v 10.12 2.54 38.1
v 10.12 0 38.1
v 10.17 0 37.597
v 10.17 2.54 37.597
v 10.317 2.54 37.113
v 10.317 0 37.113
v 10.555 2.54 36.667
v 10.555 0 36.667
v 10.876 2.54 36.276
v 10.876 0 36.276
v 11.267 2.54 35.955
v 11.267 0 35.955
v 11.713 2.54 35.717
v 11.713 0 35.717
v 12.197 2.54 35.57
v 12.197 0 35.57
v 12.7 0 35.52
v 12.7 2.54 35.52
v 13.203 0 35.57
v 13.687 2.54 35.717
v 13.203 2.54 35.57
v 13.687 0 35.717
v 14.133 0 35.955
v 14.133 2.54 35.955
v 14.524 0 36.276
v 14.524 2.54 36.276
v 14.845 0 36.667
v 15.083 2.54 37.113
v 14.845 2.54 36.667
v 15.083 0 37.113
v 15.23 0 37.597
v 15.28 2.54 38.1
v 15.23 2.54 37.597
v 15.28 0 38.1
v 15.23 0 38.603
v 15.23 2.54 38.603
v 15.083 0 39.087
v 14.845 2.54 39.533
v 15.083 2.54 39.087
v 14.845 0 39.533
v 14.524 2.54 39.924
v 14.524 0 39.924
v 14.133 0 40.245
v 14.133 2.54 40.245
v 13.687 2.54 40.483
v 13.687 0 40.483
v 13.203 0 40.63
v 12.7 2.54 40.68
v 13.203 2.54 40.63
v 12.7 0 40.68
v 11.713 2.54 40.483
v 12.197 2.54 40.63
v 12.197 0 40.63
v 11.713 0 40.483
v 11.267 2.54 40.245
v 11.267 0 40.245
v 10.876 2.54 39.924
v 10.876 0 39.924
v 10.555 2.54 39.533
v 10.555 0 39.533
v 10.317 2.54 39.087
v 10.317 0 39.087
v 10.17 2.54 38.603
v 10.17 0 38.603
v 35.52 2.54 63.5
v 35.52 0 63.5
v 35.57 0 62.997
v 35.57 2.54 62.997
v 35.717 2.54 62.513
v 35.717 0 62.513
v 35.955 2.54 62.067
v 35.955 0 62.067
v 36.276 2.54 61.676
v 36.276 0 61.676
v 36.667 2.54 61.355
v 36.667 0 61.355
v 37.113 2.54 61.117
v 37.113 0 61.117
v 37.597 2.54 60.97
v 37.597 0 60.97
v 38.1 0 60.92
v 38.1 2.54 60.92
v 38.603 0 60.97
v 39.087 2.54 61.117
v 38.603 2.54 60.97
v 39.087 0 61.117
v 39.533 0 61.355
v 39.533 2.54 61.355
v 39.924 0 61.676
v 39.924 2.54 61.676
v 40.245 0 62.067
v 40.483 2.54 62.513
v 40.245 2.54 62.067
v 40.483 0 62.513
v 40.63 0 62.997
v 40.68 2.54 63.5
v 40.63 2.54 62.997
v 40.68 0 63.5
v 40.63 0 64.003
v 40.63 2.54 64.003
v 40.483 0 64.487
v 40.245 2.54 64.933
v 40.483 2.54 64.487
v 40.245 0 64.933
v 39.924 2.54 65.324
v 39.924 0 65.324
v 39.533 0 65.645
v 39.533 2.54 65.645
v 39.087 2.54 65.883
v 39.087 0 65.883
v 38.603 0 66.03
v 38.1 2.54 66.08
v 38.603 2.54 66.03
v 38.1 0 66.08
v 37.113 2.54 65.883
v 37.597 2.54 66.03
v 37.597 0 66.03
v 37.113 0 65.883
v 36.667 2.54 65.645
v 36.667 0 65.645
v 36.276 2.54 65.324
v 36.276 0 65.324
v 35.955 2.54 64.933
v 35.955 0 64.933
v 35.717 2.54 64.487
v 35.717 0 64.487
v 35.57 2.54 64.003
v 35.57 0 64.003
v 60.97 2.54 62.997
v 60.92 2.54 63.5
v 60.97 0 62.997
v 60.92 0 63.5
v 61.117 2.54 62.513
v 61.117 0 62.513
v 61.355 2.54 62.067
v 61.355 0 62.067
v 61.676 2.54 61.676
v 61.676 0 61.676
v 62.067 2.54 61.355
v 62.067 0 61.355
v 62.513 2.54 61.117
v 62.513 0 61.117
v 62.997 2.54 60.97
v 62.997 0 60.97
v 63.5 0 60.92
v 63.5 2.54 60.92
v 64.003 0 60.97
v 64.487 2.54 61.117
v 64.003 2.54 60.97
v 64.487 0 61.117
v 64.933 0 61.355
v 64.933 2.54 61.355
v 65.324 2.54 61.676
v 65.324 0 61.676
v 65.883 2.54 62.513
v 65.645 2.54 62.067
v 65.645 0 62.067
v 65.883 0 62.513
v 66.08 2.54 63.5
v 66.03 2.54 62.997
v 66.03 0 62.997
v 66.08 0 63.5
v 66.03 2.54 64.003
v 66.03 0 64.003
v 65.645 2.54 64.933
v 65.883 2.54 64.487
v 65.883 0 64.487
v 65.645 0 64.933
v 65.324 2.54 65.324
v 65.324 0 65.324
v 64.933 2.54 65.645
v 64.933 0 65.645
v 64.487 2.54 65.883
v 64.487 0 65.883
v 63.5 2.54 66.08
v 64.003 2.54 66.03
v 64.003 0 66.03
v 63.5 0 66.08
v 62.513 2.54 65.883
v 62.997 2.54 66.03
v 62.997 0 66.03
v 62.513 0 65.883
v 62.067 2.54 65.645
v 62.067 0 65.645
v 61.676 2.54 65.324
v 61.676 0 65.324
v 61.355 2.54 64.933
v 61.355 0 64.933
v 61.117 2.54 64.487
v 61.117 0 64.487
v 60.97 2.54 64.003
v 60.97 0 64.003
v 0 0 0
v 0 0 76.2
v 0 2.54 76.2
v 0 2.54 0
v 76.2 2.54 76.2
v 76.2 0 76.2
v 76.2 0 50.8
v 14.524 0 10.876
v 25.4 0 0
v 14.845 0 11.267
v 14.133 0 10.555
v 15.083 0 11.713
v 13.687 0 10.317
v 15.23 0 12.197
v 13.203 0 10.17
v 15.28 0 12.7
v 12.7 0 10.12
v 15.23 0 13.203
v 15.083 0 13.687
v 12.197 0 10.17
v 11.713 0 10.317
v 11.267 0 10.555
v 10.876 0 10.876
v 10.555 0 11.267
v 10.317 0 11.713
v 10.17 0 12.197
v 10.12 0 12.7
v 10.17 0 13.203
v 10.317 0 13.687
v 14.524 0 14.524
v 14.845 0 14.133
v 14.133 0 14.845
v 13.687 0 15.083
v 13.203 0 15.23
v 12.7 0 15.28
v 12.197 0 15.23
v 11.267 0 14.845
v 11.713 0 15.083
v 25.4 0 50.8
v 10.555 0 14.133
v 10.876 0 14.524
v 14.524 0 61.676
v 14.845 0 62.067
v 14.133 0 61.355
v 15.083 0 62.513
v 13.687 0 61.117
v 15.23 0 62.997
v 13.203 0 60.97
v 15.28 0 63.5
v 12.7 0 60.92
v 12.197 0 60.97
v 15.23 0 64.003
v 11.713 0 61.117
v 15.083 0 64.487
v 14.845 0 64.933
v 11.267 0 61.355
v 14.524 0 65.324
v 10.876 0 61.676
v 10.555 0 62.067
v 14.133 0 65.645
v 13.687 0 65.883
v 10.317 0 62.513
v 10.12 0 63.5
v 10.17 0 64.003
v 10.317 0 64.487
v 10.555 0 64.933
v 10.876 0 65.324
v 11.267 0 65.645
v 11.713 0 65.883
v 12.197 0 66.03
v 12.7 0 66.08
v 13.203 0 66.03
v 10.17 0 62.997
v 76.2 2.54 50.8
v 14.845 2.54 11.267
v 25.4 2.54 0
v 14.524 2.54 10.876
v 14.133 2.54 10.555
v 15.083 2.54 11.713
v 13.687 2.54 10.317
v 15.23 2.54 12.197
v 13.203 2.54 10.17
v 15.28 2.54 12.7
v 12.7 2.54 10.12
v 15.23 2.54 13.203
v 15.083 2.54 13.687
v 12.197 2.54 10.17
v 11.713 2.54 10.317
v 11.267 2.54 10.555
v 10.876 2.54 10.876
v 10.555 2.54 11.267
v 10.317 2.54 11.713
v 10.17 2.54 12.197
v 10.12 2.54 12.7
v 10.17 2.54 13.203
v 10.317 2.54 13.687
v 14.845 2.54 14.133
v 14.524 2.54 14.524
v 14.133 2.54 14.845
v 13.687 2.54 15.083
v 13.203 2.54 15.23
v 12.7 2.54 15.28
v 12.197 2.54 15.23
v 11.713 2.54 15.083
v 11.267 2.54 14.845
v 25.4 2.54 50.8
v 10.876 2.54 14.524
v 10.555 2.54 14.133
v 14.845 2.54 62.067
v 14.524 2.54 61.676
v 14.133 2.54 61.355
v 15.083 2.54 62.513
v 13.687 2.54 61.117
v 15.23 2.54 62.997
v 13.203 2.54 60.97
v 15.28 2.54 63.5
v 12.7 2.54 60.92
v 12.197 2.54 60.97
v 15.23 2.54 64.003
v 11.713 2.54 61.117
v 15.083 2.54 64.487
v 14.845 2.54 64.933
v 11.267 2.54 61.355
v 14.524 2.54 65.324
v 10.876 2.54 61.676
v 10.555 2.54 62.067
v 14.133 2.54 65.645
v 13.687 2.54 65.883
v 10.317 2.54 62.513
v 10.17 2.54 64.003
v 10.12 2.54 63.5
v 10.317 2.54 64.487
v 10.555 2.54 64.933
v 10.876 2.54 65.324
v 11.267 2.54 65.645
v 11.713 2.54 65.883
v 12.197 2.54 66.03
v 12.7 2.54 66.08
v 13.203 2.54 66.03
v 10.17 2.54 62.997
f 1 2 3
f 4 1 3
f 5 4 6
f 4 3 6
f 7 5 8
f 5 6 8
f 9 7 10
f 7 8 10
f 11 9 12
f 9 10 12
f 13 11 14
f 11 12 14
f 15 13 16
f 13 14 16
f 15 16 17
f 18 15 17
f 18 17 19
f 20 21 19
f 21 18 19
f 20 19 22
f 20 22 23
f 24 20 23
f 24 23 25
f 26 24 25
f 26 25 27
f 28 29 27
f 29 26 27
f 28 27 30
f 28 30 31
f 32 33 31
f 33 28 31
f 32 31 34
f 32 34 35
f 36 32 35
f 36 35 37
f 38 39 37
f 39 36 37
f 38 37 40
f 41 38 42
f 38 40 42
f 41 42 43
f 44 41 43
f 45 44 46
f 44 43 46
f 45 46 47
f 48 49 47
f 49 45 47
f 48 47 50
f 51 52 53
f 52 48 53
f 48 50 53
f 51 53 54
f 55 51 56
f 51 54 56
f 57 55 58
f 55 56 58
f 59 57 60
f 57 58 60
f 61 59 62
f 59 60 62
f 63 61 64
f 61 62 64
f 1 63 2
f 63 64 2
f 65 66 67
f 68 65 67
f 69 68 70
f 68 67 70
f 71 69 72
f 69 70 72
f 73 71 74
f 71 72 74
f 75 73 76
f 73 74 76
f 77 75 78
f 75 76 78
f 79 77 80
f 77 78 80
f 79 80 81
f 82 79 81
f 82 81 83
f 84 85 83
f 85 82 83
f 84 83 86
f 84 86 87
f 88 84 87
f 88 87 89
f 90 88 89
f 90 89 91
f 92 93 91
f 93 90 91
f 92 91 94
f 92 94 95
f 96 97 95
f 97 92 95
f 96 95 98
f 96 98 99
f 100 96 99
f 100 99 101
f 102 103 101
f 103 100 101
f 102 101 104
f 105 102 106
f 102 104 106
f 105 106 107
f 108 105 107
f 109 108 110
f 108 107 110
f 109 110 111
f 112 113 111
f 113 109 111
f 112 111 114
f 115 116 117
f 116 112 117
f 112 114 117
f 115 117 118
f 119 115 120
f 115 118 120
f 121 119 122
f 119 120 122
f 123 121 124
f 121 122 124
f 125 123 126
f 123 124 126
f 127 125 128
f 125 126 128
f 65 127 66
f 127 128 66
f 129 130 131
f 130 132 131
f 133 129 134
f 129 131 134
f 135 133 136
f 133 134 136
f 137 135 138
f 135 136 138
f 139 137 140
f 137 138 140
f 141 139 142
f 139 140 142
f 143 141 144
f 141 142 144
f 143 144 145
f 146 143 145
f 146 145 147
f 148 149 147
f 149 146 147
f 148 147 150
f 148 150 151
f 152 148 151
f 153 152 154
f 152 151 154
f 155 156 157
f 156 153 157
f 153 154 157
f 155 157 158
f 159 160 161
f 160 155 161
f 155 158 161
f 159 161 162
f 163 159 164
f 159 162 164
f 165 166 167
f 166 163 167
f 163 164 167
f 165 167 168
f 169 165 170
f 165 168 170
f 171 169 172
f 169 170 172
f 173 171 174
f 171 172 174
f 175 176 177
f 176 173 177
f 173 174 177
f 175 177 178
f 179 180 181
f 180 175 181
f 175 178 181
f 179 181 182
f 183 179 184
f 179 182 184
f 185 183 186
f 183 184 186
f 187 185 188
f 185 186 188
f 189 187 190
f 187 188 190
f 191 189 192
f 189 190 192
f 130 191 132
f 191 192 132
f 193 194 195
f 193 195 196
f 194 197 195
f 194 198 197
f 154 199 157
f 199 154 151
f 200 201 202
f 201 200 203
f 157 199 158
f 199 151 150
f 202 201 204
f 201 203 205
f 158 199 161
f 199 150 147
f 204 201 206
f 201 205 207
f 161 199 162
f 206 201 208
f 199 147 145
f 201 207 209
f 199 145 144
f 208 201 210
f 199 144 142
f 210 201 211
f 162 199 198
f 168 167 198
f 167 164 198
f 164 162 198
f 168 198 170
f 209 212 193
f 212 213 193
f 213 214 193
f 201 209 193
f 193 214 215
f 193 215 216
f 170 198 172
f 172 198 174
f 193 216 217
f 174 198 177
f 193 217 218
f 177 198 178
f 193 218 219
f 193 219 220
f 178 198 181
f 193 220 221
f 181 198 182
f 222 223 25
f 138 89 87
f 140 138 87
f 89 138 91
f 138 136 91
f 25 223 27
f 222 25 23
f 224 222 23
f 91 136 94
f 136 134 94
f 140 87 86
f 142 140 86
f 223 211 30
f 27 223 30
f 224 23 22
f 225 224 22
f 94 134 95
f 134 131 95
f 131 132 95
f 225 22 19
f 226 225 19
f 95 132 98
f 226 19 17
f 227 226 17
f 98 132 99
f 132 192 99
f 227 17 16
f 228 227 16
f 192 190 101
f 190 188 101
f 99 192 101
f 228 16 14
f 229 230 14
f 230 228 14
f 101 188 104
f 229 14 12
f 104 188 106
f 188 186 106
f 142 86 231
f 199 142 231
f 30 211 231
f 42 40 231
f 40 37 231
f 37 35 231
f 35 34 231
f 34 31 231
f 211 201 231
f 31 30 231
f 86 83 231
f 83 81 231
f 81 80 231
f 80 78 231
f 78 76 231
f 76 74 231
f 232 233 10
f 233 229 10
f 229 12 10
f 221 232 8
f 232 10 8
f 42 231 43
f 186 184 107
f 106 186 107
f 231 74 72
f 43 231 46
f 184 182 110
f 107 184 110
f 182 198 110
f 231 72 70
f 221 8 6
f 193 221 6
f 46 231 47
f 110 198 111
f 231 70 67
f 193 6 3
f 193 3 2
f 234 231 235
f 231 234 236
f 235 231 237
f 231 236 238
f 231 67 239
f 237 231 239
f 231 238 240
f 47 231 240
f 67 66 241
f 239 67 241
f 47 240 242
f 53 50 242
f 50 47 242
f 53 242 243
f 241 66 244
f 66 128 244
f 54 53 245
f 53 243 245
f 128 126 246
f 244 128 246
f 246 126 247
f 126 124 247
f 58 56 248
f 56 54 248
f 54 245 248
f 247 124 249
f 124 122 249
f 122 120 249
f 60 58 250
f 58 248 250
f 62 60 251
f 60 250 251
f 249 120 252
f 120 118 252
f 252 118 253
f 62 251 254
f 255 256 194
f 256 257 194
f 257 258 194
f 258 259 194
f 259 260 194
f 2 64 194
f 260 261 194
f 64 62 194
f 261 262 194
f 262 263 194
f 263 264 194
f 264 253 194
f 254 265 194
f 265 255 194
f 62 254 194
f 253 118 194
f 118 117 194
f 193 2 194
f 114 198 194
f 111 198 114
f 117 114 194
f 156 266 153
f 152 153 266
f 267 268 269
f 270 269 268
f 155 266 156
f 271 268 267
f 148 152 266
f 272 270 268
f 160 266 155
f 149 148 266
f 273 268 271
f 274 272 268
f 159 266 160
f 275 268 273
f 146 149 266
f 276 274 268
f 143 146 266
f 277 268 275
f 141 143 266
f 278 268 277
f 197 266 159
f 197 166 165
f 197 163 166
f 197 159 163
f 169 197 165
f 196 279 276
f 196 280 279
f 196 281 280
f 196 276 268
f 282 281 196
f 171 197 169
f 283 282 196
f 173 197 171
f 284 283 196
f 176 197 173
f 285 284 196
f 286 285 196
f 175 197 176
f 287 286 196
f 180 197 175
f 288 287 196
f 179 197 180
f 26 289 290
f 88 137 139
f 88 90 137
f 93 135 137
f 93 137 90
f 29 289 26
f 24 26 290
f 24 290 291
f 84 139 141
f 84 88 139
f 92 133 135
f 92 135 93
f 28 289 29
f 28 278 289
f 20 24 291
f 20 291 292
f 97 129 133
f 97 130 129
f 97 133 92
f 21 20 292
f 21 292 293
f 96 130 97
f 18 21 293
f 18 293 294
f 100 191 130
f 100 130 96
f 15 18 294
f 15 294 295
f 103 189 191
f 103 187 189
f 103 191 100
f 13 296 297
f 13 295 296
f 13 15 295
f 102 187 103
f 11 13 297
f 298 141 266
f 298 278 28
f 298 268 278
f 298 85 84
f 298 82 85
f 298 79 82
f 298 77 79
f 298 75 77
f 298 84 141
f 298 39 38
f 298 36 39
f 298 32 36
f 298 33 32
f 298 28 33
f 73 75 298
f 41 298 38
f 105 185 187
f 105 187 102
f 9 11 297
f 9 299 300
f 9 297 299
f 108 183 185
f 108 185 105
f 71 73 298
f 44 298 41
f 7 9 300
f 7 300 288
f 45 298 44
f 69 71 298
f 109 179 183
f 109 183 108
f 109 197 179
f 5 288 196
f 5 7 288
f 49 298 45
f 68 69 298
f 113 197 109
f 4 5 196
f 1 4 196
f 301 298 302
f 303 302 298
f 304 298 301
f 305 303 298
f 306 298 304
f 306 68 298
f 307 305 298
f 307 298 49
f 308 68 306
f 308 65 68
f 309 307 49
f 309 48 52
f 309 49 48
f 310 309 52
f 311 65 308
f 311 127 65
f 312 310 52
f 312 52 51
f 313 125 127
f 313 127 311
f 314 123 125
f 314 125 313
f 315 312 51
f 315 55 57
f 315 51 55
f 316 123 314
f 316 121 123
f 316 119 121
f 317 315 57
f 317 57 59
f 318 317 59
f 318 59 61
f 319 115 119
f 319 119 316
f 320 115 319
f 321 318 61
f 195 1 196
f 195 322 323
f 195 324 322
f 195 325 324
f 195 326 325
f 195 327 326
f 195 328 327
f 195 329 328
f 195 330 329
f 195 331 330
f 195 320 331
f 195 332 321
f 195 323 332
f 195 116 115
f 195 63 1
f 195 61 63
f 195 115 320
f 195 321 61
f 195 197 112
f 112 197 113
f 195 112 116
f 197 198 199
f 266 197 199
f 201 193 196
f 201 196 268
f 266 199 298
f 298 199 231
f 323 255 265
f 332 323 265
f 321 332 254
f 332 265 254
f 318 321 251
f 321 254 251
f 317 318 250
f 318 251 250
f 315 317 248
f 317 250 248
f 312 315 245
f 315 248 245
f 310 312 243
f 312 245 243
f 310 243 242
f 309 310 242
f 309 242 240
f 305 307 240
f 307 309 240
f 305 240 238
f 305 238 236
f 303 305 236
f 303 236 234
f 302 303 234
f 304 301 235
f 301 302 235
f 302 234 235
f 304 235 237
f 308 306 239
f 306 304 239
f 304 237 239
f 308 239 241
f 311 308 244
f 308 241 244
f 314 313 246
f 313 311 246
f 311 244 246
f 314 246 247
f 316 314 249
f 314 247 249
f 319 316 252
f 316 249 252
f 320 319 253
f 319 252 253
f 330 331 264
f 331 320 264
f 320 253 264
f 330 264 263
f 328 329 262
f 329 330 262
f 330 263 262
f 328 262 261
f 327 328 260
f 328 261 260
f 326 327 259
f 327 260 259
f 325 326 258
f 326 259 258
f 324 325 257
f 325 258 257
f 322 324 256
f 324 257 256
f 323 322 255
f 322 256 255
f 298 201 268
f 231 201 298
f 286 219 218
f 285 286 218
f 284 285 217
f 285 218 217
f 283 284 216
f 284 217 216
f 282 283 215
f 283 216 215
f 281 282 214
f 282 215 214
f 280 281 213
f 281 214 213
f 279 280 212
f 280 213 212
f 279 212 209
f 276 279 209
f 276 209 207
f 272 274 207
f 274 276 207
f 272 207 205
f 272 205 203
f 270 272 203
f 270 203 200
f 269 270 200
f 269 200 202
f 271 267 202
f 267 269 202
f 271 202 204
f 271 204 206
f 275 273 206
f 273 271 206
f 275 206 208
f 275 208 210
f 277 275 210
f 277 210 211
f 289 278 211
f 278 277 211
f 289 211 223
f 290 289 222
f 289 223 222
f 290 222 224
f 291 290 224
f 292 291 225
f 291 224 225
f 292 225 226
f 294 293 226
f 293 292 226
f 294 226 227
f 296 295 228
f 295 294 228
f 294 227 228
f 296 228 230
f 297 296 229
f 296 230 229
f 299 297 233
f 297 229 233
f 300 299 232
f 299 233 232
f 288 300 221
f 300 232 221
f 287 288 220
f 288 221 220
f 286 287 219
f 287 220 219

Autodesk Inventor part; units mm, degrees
ref_plane "YZ Plane" through (0, 0, 0) normal (1, 0, 0) x (0, 1, 0)
ref_plane "XZ Plane" through (0, 0, 0) normal (0, 1, 0) x (-1, 0, 0)
ref_plane "XY Plane" through (0, 0, 0) normal (0, 0, 1) x (1, 0, 0)
sketch "Sketch1" plane through (0, 0, 0) normal (0, 1, 0) x (-1, 0, 0)
  line L0 (0, 0) -> (-25.4, 0)
  line L1 (-25.4, 0) -> (-25.4, 76.2)
  line L2 (-25.4, 76.2) -> (0, 76.2)
  line L3 (0, 76.2) -> (0, 0)
  line L4 (-25.4, 76.2) -> (-76.2, 76.2)
  line L5 (-76.2, 76.2) -> (-76.2, 50.8)
  line L6 (-76.2, 50.8) -> (-25.4, 50.8)
  line L7 (-25.4, 50.8) -> (-25.4, 76.2)
  circle A0 centre (-63.5, 63.5) radius 2.5797
  circle A1 centre (-38.1, 63.5) radius 2.5797
  circle A2 centre (-12.7, 63.5) radius 2.5797
  circle A3 centre (-12.7, 38.1) radius 2.5797
  circle A4 centre (-12.7, 12.7) radius 2.5797
  dimension "d0" = 0
  dimension "d1" = 25.4
  dimension "d2" = 76.2
  dimension "d3" = 50.8
  dimension "d4" = 25.4
  dimension "d5" = 12.7
  dimension "d6" = 12.7
  dimension "d7" = 12.7
  dimension "d8" = 12.7
  dimension "d9" = 25.4
  dimension "d10" = 25.4
  dimension "d11" = 5.1594
  dimension "d12" = 5.1594
  dimension "d13" = 5.1594
  dimension "d14" = 5.1594
  dimension "d15" = 5.1594
  dimension "d16" = 12.7
  dimension "d17" = 12.7
  dimension "d18" = 12.7
  dimension "d19" = 25.4
  dimension "d20" = 12.7
extrude "Extrusion1" add sketch "Sketch1" along normal blind 2.54
equation "\"d6\" = d5"
equation "\"d7\" = d5"
equation "\"d12\" = d11"
equation "\"d13\" = d11"
equation "\"d14\" = d11"
equation "\"d15\" = d11"
properties part number "Bracing 3x3"
